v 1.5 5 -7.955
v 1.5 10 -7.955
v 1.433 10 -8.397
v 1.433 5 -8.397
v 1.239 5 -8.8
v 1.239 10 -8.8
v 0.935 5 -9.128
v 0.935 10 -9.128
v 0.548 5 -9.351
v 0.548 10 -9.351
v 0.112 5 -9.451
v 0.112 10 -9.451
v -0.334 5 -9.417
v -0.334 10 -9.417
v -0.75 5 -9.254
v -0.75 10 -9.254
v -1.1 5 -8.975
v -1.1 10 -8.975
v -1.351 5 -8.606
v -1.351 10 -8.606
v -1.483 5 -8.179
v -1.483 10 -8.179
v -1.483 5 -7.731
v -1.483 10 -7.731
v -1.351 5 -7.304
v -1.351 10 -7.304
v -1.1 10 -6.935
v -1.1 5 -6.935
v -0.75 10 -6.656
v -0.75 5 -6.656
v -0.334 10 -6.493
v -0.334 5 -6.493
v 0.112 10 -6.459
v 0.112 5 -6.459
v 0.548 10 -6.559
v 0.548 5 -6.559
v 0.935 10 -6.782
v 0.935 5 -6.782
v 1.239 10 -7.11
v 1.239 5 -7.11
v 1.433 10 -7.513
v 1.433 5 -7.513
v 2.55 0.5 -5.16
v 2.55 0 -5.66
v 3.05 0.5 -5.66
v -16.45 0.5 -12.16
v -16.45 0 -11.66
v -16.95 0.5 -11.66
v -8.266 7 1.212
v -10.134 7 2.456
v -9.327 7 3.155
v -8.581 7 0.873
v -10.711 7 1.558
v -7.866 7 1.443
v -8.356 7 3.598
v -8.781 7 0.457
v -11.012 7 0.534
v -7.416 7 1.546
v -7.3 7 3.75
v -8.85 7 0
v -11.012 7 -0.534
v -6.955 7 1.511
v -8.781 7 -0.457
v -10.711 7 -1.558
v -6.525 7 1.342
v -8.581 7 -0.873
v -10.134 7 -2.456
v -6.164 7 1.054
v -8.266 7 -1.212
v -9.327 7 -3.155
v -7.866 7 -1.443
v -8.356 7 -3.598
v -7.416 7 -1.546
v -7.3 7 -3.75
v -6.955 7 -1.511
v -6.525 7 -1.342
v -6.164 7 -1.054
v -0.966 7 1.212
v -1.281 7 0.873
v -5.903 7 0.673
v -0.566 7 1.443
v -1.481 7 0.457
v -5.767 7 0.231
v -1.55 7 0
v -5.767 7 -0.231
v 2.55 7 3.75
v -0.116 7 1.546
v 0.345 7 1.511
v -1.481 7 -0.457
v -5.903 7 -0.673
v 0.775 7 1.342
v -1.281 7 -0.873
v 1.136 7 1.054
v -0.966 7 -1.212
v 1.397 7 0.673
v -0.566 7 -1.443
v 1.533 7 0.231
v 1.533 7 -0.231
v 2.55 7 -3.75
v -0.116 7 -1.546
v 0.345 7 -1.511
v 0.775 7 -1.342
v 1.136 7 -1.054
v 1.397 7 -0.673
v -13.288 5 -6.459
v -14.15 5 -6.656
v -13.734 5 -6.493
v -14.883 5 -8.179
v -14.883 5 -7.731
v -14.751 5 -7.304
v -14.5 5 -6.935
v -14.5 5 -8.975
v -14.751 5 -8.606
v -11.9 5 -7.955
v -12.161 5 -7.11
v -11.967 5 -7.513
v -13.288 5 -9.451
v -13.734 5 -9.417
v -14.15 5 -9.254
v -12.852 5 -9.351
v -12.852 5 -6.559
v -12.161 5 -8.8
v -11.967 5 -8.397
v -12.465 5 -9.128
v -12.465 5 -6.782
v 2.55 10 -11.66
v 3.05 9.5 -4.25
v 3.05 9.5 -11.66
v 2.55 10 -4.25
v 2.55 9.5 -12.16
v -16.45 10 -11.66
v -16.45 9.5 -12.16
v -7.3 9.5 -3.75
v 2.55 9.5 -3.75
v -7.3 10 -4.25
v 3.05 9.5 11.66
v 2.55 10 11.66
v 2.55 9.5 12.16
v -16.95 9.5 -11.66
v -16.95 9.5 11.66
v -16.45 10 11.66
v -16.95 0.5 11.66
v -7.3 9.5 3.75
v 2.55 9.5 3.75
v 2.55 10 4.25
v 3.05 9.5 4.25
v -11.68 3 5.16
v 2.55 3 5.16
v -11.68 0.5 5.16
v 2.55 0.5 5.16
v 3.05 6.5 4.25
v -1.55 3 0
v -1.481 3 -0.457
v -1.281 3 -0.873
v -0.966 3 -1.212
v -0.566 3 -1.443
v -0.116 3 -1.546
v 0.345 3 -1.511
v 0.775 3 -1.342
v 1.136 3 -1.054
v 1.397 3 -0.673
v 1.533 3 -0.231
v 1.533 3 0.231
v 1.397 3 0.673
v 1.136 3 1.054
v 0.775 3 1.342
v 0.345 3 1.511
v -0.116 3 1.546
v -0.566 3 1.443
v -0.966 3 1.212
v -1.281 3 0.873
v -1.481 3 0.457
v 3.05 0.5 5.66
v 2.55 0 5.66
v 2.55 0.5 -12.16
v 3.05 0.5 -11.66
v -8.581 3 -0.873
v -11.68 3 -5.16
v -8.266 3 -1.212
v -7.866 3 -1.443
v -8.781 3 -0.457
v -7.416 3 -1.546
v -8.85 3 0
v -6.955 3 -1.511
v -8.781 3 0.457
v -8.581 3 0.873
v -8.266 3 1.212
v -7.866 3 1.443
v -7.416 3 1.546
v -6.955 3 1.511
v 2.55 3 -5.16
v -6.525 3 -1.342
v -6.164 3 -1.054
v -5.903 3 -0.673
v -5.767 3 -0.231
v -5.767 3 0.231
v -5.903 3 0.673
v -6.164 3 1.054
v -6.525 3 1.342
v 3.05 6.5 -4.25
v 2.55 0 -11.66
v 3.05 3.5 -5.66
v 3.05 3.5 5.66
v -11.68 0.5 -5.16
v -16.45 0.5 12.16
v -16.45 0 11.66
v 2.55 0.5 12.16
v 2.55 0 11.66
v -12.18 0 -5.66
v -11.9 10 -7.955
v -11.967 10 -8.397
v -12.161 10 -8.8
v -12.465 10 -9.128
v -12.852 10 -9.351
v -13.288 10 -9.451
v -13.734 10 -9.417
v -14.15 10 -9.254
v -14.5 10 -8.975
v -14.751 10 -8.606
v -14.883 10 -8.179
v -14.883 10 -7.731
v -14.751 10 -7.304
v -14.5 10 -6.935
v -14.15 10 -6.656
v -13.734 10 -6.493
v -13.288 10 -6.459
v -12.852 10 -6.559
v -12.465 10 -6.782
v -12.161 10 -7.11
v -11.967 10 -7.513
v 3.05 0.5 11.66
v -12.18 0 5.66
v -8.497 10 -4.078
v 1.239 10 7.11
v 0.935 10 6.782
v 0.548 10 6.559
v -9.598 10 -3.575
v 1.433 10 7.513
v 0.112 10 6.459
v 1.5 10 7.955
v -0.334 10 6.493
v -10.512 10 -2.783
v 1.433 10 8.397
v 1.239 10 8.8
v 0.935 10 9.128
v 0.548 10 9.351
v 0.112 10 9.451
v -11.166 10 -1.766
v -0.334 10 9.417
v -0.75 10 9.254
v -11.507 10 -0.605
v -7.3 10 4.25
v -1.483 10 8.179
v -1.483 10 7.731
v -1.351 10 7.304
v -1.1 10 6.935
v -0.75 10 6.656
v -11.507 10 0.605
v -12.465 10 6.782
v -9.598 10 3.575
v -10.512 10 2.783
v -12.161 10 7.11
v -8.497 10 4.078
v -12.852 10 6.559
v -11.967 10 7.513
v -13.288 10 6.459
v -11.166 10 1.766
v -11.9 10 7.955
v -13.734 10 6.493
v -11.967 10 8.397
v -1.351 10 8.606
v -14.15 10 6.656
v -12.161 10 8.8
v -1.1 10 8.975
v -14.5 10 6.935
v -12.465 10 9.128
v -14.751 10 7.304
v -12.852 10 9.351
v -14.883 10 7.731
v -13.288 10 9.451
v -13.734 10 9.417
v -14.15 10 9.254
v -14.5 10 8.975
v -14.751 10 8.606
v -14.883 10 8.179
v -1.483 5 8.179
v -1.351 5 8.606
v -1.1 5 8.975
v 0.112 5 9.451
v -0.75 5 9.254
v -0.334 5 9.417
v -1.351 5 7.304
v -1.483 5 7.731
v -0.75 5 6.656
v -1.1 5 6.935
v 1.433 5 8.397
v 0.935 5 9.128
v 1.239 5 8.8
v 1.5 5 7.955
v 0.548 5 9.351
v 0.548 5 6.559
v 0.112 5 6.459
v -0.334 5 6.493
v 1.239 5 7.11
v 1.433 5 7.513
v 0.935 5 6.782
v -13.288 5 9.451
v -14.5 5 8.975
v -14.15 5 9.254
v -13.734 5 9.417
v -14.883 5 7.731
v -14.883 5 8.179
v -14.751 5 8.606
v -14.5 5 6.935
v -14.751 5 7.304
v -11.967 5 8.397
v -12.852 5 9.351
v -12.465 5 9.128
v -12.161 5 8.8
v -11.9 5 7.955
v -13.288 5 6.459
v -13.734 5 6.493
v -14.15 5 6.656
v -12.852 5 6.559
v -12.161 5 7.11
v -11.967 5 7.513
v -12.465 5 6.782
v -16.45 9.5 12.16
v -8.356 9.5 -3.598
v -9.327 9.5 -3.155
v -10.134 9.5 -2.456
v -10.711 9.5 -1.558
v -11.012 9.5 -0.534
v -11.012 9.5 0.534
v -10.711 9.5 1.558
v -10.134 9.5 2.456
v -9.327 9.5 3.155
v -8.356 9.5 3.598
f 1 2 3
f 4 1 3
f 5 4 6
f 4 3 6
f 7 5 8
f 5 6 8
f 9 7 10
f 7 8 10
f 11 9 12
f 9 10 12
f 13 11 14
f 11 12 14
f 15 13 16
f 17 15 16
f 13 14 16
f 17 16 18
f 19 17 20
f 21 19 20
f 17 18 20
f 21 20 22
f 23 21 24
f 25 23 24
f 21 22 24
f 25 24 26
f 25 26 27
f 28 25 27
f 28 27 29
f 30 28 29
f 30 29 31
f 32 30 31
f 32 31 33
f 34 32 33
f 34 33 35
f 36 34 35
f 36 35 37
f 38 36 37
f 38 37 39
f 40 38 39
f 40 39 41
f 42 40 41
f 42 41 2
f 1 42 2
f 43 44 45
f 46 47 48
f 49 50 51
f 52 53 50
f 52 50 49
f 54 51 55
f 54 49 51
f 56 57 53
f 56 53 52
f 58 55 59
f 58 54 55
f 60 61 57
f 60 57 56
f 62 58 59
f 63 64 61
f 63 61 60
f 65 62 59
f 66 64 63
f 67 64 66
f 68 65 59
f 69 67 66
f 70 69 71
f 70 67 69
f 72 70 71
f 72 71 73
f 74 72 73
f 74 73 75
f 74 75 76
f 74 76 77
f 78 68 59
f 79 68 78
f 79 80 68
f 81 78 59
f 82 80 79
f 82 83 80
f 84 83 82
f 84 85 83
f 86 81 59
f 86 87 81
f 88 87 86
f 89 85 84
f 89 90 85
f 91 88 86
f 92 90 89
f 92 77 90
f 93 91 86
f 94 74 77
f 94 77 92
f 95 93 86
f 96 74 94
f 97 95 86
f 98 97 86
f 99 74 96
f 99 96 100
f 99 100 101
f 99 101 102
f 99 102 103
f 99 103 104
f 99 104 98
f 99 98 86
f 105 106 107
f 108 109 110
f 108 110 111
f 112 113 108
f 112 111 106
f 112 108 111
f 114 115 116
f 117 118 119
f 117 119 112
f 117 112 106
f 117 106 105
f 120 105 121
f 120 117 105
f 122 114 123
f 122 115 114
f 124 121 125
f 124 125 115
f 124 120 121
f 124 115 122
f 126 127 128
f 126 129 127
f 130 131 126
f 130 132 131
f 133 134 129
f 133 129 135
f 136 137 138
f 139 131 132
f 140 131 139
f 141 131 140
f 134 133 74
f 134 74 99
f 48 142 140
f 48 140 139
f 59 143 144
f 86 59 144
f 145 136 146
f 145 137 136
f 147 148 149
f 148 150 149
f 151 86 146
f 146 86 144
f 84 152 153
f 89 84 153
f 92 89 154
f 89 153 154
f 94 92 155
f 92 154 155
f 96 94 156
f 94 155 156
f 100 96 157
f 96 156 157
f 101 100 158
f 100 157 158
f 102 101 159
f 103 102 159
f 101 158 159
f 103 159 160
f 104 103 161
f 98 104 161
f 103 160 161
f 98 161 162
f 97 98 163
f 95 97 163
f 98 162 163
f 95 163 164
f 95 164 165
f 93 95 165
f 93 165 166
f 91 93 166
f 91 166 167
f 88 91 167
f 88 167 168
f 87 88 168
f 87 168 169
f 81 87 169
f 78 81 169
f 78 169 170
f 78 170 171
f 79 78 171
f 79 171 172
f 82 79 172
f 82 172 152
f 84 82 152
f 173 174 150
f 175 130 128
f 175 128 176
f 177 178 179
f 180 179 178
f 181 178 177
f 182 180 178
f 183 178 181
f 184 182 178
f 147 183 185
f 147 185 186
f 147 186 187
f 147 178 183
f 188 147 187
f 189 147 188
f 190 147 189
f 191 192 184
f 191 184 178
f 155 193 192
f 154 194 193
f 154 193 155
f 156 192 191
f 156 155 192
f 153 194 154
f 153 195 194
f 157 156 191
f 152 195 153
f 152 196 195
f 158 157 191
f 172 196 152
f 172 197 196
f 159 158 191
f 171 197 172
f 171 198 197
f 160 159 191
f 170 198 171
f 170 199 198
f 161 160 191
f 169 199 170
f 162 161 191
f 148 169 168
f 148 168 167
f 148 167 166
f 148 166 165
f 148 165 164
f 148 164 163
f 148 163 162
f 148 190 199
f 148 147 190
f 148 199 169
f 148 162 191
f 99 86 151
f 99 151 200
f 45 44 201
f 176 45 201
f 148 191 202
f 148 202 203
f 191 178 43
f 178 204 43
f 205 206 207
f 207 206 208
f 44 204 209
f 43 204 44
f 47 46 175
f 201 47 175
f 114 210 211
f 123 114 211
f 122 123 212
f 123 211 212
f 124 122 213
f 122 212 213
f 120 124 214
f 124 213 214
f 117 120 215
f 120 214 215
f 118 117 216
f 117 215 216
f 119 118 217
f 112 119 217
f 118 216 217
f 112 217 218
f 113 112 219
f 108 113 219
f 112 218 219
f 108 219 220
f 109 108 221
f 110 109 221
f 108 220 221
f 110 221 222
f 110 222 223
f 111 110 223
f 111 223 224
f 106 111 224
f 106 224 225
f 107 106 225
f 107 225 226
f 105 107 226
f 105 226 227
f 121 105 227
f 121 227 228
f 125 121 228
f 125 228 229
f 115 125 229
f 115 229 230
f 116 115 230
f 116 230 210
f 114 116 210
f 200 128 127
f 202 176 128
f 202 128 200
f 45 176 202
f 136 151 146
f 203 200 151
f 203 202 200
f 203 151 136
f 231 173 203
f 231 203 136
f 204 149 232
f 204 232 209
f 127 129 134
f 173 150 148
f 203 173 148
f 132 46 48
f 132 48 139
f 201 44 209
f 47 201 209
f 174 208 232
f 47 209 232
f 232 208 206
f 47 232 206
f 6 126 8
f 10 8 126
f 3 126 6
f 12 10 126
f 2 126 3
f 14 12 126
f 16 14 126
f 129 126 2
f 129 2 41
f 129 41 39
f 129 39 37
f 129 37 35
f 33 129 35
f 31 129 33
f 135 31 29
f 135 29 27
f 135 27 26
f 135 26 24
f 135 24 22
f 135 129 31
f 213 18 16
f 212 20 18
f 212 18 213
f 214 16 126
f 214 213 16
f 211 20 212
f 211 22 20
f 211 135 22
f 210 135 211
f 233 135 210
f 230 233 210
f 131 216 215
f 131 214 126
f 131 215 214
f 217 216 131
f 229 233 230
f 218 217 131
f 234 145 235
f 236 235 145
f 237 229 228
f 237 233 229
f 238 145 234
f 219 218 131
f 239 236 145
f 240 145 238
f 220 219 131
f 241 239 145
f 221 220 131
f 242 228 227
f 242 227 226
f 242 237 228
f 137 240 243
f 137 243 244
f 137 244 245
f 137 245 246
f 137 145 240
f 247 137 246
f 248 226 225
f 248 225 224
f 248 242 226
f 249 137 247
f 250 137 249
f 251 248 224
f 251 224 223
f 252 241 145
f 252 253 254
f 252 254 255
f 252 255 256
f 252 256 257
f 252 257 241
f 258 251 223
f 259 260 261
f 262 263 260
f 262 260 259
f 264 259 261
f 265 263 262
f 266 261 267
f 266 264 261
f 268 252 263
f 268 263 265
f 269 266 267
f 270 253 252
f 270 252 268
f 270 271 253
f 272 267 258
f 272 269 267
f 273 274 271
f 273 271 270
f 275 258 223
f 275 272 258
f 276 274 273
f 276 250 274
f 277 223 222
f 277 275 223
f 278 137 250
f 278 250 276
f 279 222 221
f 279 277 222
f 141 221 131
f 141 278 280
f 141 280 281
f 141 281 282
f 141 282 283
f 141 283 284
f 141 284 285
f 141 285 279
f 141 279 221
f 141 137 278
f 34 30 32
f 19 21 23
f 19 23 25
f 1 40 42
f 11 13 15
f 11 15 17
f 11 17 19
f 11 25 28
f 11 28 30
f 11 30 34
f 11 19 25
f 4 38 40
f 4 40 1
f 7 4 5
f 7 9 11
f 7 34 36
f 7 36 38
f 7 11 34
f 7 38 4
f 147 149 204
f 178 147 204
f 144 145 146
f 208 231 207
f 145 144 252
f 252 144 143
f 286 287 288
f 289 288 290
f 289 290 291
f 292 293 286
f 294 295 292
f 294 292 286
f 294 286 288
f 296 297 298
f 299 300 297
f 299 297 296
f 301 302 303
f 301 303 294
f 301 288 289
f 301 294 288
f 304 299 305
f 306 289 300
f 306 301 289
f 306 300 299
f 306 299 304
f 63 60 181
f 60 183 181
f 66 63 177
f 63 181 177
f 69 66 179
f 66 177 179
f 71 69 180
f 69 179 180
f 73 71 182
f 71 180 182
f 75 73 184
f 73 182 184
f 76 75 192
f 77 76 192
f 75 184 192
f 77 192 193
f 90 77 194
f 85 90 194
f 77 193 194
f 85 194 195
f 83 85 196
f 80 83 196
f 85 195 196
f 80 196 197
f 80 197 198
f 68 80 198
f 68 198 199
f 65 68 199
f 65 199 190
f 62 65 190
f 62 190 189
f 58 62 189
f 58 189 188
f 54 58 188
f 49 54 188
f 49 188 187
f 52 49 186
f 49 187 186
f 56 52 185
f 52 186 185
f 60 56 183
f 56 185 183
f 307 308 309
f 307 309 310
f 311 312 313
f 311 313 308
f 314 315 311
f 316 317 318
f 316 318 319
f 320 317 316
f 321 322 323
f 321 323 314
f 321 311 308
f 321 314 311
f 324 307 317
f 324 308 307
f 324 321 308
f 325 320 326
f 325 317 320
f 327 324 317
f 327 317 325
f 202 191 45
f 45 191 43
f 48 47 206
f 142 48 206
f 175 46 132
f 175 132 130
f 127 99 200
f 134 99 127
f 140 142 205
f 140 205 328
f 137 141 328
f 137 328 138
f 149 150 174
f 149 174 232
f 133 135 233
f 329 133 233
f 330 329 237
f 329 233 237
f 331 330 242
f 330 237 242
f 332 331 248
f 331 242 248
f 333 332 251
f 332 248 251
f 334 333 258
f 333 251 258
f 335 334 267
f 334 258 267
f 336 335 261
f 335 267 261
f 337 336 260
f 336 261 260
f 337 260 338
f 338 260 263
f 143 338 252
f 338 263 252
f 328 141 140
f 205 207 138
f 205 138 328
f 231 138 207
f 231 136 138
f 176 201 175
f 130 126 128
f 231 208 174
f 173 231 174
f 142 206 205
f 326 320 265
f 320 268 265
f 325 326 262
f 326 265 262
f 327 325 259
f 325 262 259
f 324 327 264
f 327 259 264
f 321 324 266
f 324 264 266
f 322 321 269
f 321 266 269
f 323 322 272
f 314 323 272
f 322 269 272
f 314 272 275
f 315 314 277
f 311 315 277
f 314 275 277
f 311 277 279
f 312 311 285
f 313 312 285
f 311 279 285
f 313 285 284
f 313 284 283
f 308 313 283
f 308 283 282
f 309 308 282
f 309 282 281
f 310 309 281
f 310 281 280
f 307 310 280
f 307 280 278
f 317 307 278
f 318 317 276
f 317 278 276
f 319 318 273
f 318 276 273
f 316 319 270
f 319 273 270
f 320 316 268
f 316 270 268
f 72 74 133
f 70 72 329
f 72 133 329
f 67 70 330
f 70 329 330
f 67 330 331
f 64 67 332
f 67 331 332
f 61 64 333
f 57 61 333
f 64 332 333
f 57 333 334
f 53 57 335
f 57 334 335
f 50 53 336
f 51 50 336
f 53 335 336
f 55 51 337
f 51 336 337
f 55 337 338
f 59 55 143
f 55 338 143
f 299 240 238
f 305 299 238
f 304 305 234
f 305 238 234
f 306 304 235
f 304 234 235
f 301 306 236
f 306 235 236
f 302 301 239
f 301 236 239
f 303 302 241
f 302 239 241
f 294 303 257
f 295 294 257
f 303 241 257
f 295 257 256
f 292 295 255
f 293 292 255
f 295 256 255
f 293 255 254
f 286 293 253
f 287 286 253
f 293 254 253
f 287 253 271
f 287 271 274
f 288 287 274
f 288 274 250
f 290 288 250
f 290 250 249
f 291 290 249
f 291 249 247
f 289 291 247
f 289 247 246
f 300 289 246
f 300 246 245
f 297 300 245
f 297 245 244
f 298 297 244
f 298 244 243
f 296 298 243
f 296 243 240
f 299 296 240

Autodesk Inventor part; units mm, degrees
ref_plane "YZ Plane" through (0, 0, 0) normal (1, 0, 0) x (0, 1, 0)
ref_plane "XZ Plane" through (0, 0, 0) normal (0, 1, 0) x (-1, 0, 0)
ref_plane "XY Plane" through (0, 0, 0) normal (0, 0, 1) x (1, 0, 0)
sketch "Sketch1" plane through (0, 0, 0) normal (0, 1, 0) x (-1, 0, 0)
  circle A0 centre (7.3, 0) radius 1.55
  circle A1 centre (0, 0) radius 1.55
  line L0 (0, 10.8163) -> (0, -10.8163)
  line L1 (6.335, 0) -> (-6.335, 0)
  line L2 (-3.05, 12.16) -> (16.95, 12.16)
  line L3 (16.95, 12.16) -> (16.95, -12.16)
  line L4 (16.95, -12.16) -> (-3.05, -12.16)
  line L5 (-3.05, -12.16) -> (-3.05, 12.16)
  dimension "d0" = 3.1
  dimension "d1" = 7.3
  dimension "d2" = 1.5
  dimension "d3" = 24.32
  dimension "d4" = 20
extrude "Extrusion1" add sketch "Sketch1" along normal blind 10
sketch "Sketch2" plane through (0, 0, 0) normal (0, -1, 0) x (1, 0, 0)
  line L0 (3.05, 5.16) -> (-11.68, 5.16)
  line L1 (-11.68, 5.16) -> (-11.68, -5.16)
  line L2 (-11.68, -5.16) -> (3.05, -5.16)
  line L3 (3.05, -5.16) -> (3.05, 5.16)
  circle A0 centre (0, 0) radius 1.55 projected
  circle A1 centre (-7.3, 0) radius 1.55 projected
  line L4 (0, 0) -> (-7.3, 0)
  line L5 (3.05, 12.16) -> (3.05, -12.16) projected
  dimension "d7" = 10.32
  dimension "d8" = 4.38
extrude "Extrusion2" cut sketch "Sketch2" against normal blind 3
sketch "Sketch3" plane through (0, 10, 0) normal (0, 1, 0) x (1, 0, 0)
  circle A0 centre (-7.3, 0) radius 1.55 projected
  circle A1 centre (0, 0) radius 1.55 projected
  arc A2 (3.05, -2.1817) -> (3.05, 2.1817) centre (0, 0) ccw
  arc A3 (-7.3, 3.75) -> (-7.3, -3.75) centre (-7.3, 0) ccw
  line L0 (3.05, -12.16) -> (3.05, 12.16) projected
  line L1 (-7.3, 3.75) -> (0, 3.75)
  line L2 (-7.3, -3.75) -> (0, -3.75)
  line L3 (3.05, -2.1817) -> (3.05, 2.1817)
  line L4 (3.05, -2.1817) -> (3.05, 2.1817)
  line L5 (0, -3.75) -> (3.05, -3.75)
  line L6 (0, 3.75) -> (3.05, 3.75)
  dimension "d11" = 7.5
extrude "Extrusion3" cut sketch "Sketch3" against normal blind 3 contours L0 L5 L2 A3 L1 L6
sketch "Sketch4" plane through (0, 10, 0) normal (0, 1, 0) x (1, 0, 0)
  line L0 (3.05, -12.16) -> (3.05, -3.75) projected
  line L1 (3.05, -3.75) -> (-7.3, -3.75) projected
  arc A0 (-7.3, 3.75) -> (-7.3, -3.75) centre (-7.3, 0) ccw projected
  line L2 (-7.3, 3.75) -> (3.05, 3.75) projected
  line L3 (3.05, 3.75) -> (3.05, -3.75) projected
  circle A1 centre (0, -7.955) radius 1.5
  circle A2 centre (-13.4, -7.955) radius 1.5
  line L4 (-16.95, 12.16) -> (-16.95, -12.16) projected
  line L5 (-16.95, 0) -> (3.05, 0)
  circle A3 centre (0, 7.955) radius 1.5
  circle A4 centre (-13.4, 7.955) radius 1.5
  line L6 (3.05, -7.955) -> (-16.95, -7.955)
  line L7 (3.05, 5.16) -> (3.05, 12.16) projected
  line L8 (3.05, 7.955) -> (-16.95, 7.955)
  line L9 (-11.05, 0) -> (-16.95, 0) construction
  point P0 (0, 0)
  dimension "d15" = 3
  dimension "d16" = 3
  dimension "d18" = 3.05
  dimension "d19" = 3.55
extrude "Extrusion4" cut sketch "Sketch4" against normal blind 5 contours L6 A1 | A1 L6 | L6 A2 | A2 L6 | L8 A3 | A3 L8 | L8 A4 | A4 L8
chamfer "Chamfer1" distance 0.5 angle 45 26 edges at (3.05, 10, 7.955) (-2.125, 10, 3.75) (-11.05, 10, 0) (-2.125, 10, -3.75) (3.05, 10, -7.955) (-6.95, 10, -12.16) (-16.95, 10, 0) (-6.95, 10, 12.16) (3.05, 5, 12.16) (3.05, 0, 8.66) (-6.95, 0, 12.16) (-16.95, 0, 0) (-6.95, 0, -12.16) (3.05, 0, -8.66) (3.05, 5, -12.16) (-16.95, 5, -12.16) (-16.95, 5, 12.16) (-11.68, 0, 0) (-4.315, 0, 5.16) (-4.315, 0, -5.16) (3.05, 1.5, 5.16) (3.05, 1.5, -5.16) (3.05, 3, 0) (3.05, 7, 0) (3.05, 8.5, 3.75) (3.05, 8.5, -3.75)
equation "\"d0\" = spacer_hole_diameter"
equation "\"d1\" = load_cell_hole_discance"
equation "\"load_cell_hole_discance\" = 7.3"
equation "\"spacer_hole_diameter\" = 3.1"
equation "\"load_cell_width\" = 9.32"
equation "\"load_cell_hole_edge\" = 4.18"
properties part number "load_cell_connector_bottom"
